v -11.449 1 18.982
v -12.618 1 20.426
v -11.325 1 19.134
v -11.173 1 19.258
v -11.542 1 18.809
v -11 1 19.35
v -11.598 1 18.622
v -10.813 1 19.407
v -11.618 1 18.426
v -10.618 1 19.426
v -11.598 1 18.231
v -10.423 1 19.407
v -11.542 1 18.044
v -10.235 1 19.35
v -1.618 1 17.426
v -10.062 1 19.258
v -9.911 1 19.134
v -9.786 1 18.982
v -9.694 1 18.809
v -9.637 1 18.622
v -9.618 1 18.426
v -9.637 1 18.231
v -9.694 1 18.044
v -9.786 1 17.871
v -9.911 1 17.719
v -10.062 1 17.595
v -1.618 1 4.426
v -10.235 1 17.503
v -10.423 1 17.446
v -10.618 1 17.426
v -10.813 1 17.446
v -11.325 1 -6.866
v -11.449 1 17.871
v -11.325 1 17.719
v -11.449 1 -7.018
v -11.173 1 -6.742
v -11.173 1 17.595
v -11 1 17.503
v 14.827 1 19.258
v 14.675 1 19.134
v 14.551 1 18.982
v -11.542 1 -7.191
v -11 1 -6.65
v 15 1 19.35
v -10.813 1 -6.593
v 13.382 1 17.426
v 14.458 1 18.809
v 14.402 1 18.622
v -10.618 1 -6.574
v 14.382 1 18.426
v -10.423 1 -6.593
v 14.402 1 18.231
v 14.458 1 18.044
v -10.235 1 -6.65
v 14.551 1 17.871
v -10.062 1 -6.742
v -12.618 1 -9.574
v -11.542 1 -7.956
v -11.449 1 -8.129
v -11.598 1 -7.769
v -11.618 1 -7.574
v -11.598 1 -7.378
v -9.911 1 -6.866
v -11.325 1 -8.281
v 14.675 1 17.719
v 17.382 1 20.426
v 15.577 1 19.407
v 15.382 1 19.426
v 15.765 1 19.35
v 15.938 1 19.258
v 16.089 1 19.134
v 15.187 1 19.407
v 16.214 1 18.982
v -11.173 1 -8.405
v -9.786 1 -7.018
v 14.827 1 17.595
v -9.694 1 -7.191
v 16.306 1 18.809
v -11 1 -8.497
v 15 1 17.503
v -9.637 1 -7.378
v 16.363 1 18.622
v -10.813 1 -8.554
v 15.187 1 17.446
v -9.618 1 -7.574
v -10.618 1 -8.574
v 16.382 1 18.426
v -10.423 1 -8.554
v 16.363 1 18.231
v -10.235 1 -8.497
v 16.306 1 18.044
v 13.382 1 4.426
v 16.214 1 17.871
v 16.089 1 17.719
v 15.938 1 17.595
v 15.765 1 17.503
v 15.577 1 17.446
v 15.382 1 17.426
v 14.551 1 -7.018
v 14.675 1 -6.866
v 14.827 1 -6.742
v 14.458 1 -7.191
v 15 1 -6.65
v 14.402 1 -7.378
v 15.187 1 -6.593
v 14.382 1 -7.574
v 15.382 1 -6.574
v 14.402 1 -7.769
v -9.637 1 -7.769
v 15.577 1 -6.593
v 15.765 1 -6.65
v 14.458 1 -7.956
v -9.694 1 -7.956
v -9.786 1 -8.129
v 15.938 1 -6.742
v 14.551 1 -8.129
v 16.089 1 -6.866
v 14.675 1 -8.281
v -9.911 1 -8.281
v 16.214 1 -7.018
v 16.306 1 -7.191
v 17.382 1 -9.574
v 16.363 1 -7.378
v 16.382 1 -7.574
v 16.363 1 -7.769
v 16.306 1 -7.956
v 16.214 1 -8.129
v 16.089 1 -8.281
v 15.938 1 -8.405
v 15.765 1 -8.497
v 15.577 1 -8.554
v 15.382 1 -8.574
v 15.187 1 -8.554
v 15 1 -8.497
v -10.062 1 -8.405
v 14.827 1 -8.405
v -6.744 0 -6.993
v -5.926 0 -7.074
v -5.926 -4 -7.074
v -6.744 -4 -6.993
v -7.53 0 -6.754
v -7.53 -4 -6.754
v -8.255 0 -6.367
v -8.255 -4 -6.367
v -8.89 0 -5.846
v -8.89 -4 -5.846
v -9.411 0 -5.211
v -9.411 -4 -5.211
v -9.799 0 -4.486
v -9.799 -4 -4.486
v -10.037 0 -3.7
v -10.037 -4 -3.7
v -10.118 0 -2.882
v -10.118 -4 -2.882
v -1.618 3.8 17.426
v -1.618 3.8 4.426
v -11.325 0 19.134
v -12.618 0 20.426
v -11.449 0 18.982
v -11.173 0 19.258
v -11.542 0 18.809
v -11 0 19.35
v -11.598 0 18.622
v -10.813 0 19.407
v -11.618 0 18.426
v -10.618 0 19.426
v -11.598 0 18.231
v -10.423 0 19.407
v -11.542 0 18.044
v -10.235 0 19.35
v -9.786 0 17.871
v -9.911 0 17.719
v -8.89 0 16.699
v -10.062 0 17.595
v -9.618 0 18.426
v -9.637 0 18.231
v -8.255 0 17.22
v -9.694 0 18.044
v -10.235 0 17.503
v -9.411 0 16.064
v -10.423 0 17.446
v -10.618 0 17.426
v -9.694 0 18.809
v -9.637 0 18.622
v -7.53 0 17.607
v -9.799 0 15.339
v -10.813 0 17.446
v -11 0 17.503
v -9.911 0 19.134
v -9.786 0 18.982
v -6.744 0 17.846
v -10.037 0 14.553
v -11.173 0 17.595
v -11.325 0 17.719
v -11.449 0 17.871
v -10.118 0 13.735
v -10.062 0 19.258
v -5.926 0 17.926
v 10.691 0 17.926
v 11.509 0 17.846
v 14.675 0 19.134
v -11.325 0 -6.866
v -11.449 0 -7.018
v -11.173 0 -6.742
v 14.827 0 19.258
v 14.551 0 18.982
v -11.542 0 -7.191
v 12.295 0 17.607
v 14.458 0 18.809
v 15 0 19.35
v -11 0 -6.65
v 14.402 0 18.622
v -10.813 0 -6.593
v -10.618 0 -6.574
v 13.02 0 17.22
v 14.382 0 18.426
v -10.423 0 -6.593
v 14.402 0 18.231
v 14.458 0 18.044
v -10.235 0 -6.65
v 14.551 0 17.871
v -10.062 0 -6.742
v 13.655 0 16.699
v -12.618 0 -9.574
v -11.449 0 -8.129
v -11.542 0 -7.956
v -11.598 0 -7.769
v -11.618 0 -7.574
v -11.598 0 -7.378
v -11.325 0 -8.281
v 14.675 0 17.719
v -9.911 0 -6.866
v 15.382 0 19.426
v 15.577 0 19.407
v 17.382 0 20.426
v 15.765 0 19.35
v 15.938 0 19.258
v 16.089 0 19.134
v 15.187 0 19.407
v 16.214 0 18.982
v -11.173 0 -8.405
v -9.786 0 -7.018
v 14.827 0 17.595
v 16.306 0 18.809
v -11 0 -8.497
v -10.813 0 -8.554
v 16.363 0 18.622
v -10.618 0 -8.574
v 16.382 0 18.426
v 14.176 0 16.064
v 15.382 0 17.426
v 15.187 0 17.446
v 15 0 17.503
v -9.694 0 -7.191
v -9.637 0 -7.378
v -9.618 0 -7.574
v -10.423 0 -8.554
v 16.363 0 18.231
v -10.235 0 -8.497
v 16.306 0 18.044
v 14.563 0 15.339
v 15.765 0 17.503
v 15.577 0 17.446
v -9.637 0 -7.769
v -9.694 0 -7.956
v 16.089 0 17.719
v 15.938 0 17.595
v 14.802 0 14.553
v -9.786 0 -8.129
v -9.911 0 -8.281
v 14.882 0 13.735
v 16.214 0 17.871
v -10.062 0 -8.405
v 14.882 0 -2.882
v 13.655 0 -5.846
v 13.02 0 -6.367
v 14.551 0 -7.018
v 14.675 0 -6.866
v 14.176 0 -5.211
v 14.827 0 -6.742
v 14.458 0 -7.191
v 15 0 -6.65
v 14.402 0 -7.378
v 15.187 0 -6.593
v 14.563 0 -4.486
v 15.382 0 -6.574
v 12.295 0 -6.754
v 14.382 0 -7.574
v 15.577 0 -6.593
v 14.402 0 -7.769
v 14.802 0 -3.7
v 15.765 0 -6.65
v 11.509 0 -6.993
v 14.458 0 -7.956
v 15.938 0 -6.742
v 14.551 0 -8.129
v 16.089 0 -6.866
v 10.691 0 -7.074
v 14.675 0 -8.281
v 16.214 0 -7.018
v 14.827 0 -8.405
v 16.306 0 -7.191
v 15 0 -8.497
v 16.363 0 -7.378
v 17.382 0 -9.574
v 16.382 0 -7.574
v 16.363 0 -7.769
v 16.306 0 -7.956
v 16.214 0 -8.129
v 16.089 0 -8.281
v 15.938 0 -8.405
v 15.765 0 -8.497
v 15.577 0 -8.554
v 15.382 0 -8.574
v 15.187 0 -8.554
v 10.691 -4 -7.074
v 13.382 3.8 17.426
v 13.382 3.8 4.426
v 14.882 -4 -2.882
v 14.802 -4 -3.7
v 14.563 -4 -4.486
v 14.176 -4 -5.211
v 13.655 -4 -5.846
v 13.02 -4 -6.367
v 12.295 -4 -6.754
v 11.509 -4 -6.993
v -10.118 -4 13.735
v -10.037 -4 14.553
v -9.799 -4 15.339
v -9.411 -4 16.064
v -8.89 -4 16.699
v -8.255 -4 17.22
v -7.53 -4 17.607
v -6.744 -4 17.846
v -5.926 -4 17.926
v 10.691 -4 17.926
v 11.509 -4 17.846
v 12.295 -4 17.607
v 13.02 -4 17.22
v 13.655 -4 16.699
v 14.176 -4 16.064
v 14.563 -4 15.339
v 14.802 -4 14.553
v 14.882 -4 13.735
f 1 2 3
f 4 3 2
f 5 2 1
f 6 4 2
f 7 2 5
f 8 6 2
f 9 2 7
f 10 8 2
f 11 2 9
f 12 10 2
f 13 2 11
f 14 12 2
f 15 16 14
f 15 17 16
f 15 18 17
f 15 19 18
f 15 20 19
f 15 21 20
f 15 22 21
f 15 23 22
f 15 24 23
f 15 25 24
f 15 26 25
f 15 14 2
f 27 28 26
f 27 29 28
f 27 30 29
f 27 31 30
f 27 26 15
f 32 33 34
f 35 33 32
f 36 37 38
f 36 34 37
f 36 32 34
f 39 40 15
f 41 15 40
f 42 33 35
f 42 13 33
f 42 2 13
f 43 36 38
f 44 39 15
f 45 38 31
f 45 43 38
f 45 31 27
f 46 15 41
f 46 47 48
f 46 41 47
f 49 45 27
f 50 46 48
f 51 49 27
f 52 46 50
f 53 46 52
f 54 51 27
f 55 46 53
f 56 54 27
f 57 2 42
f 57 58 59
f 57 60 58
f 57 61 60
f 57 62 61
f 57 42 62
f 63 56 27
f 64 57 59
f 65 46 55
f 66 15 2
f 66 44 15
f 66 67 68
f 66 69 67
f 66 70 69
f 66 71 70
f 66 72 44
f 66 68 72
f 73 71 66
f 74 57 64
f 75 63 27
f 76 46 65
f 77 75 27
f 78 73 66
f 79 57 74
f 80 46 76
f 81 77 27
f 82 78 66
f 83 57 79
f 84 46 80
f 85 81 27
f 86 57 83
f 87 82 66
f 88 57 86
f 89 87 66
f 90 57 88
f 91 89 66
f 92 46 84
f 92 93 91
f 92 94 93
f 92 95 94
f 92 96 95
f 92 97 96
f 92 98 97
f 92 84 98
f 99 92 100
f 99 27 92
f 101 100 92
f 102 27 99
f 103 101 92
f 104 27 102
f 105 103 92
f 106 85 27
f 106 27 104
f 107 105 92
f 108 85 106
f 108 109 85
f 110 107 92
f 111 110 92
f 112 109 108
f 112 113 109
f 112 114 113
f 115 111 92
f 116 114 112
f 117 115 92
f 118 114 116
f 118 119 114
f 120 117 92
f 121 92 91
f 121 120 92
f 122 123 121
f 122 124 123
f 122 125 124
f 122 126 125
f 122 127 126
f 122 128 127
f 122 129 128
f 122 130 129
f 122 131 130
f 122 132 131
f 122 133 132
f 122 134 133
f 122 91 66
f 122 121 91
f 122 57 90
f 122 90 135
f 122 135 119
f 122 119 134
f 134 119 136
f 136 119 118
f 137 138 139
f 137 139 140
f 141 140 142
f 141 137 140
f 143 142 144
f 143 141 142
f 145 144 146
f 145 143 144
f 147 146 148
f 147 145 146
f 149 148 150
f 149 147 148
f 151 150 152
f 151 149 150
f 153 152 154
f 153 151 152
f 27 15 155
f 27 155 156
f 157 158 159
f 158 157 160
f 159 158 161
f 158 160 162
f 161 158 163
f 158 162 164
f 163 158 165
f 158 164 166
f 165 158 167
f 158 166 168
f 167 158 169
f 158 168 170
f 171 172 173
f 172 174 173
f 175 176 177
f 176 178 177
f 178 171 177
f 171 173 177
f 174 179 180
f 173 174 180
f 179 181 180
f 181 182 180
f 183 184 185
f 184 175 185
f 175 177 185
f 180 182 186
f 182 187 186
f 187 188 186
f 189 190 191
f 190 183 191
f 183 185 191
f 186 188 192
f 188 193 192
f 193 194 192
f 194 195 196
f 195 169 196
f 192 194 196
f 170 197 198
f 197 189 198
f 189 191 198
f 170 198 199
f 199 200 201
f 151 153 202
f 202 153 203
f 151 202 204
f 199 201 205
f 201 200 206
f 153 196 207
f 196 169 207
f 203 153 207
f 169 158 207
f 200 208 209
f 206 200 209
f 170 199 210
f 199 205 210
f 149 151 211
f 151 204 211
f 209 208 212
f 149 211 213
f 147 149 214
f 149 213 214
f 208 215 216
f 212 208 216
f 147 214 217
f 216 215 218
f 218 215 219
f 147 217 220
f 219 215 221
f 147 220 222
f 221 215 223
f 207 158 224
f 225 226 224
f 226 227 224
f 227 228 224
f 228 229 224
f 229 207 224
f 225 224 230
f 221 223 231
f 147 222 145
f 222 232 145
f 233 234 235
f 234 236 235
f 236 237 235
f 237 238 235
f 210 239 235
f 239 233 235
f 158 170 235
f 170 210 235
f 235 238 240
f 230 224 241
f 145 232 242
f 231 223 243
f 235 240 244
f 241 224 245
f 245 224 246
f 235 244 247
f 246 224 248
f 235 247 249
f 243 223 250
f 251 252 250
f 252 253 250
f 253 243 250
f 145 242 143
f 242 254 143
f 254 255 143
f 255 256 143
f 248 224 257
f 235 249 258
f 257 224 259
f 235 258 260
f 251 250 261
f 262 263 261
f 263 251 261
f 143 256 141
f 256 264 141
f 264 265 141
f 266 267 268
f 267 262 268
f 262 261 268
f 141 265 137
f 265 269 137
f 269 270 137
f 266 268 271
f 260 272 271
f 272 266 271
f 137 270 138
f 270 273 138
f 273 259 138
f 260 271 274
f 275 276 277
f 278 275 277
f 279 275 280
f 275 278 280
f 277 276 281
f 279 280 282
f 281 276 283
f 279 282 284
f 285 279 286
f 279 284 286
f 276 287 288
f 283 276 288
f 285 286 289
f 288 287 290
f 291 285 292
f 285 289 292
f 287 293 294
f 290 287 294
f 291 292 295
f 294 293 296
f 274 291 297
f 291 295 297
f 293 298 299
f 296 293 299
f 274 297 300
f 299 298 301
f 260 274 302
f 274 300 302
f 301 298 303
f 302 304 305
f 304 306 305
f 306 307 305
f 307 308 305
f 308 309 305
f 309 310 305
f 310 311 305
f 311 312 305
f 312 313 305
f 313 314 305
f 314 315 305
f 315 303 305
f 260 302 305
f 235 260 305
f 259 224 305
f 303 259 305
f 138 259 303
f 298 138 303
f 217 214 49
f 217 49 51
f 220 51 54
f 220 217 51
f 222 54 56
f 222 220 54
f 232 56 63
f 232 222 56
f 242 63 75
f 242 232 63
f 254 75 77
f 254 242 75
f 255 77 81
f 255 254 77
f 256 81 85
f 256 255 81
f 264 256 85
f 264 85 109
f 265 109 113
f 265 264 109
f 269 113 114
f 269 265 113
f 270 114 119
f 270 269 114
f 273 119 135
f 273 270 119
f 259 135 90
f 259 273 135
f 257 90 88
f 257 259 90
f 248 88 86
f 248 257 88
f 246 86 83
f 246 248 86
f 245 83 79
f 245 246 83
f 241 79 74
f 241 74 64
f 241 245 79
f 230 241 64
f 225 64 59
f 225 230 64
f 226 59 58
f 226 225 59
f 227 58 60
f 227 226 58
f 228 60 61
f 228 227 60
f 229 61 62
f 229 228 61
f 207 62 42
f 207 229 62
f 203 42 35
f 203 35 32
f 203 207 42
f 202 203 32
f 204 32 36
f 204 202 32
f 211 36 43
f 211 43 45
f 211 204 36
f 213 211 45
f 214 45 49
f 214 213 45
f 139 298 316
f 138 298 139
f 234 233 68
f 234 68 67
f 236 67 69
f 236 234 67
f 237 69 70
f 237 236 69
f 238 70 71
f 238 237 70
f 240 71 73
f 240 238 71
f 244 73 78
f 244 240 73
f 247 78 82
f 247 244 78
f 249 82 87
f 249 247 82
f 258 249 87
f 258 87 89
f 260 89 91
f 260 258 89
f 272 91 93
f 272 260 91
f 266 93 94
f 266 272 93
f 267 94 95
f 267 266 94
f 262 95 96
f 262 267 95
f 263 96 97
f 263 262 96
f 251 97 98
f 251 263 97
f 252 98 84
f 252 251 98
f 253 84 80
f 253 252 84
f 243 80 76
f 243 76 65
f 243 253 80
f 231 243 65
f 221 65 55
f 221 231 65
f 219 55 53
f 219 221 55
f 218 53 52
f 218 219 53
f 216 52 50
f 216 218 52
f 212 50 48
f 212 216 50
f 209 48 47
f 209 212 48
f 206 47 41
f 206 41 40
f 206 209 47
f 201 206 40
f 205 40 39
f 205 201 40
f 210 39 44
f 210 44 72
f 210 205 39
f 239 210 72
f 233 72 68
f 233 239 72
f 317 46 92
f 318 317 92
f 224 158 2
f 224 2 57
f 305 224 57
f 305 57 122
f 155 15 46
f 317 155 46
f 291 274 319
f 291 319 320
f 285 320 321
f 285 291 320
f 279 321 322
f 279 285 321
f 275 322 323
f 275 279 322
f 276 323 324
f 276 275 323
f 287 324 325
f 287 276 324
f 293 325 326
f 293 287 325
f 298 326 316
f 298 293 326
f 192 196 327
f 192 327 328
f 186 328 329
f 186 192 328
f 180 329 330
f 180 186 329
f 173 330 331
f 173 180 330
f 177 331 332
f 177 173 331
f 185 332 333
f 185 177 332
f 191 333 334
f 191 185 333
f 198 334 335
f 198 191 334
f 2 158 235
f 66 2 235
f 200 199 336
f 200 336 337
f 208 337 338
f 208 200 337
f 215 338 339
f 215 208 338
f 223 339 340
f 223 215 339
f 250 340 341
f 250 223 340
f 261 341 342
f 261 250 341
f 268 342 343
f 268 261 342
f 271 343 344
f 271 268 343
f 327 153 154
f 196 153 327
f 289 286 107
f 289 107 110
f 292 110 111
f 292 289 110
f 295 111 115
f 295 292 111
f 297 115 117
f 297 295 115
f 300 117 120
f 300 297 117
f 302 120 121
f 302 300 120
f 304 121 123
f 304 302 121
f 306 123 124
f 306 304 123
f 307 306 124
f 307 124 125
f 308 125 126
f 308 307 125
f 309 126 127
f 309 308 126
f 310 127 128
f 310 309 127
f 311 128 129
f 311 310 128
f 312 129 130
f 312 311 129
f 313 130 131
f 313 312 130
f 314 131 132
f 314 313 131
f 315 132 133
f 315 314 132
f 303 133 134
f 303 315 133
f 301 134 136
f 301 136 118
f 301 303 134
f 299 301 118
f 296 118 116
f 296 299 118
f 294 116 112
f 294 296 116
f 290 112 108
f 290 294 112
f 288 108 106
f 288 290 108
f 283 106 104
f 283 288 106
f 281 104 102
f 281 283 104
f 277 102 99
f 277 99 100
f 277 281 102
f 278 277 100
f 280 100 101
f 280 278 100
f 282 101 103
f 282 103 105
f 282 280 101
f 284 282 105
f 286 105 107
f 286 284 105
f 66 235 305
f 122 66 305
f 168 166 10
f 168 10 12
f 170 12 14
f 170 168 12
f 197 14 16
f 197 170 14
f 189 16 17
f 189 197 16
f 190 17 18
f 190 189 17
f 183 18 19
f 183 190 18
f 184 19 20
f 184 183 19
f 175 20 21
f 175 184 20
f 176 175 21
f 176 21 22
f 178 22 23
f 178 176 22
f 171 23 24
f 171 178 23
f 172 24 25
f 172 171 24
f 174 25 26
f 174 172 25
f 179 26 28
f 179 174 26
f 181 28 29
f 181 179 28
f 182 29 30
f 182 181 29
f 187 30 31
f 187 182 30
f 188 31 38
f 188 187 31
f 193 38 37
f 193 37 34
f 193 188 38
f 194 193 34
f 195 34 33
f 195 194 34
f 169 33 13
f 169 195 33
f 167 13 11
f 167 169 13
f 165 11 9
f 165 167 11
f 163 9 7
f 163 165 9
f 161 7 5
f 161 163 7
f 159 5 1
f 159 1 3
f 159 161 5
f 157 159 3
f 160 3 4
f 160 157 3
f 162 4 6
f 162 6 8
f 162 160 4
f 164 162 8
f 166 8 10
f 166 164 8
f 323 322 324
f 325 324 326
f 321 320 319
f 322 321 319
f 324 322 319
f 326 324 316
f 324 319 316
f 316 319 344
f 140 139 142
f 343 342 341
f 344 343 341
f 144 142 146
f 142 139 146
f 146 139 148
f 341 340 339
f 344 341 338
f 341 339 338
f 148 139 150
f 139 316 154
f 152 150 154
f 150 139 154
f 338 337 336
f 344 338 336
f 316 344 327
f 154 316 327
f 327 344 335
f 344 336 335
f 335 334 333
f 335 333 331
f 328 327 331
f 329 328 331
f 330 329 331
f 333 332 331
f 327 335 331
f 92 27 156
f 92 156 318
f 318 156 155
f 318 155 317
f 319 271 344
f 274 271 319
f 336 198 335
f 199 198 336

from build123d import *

# Parameters (mm, degrees)
SKETCH1_W           = 30
SKETCH1_H           = 30
SKETCH1_R           = 1
BOSS_EXTRUDE2_DEPTH = 1
SKETCH2_W           = 15
SKETCH2_H           = 13
BOSS_EXTRUDE3_DEPTH = 2.8
BOSS_EXTRUDE4_DEPTH = 4


with BuildPart() as part:
    # Sketch1 → Boss-Extrude2 (new body)
    with BuildSketch(Plane(origin=(0, 0, 0), x_dir=(1, 0, 0), z_dir=(0, 1, 0))):
        with Locations((2.382352941, -5.426470588)):
            Rectangle(SKETCH1_W, SKETCH1_H)
        with Locations(Location((-10.617647059, 7.573529412, 0), (0, 0, 270))):  # turned: the seam where the file's is
            Circle(SKETCH1_R, mode=Mode.SUBTRACT)
        with Locations(Location((15.382352941, 7.573529412, 0), (0, 0, 270))):  # turned: the seam where the file's is
            Circle(SKETCH1_R, mode=Mode.SUBTRACT)
        with Locations(Location((15.382352941, -18.426470588, 0), (0, 0, 270))):  # turned: the seam where the file's is
            Circle(SKETCH1_R, mode=Mode.SUBTRACT)
        with Locations(Location((-10.617647059, -18.426470588, 0), (0, 0, 270))):  # turned: the seam where the file's is
            Circle(SKETCH1_R, mode=Mode.SUBTRACT)
    extrude(amount=BOSS_EXTRUDE2_DEPTH)

    # Sketch2 → Boss-Extrude3 (add)
    with BuildSketch(Plane(origin=(0, 1, 0), x_dir=(1, 0, 0), z_dir=(0, 1, 0))):
        with Locations((5.882352941, -10.926470588)):
            Rectangle(SKETCH2_W, SKETCH2_H)
    extrude(amount=BOSS_EXTRUDE3_DEPTH)

    # Sketch3 → Boss-Extrude4 (add)
    with BuildSketch(Plane.XZ):
        with BuildLine():
            Line((-5.926151738, 17.926470588), (10.69085762, 17.926470588))
            ThreePointArc((10.69085762, 17.926470588), (13.654692385, 16.698810032), (14.882352941, 13.734975267))
            Line((14.882352941, 13.734975267), (14.882352941, -2.882034091))
            ThreePointArc((14.882352941, -2.882034091), (13.654692385, -5.845868856), (10.69085762, -7.073529412))
            Line((10.69085762, -7.073529412), (-5.926151738, -7.073529412))
            ThreePointArc((-5.926151738, -7.073529412), (-8.889986503, -5.845868856), (-10.117647059, -2.882034091))
            Line((-10.117647059, -2.882034091), (-10.117647059, 13.734975267))
            ThreePointArc((-10.117647059, 13.734975267), (-8.889986503, 16.698810032), (-5.926151738, 17.926470588))
        make_face()
    extrude(amount=BOSS_EXTRUDE4_DEPTH)


solid = part.part
